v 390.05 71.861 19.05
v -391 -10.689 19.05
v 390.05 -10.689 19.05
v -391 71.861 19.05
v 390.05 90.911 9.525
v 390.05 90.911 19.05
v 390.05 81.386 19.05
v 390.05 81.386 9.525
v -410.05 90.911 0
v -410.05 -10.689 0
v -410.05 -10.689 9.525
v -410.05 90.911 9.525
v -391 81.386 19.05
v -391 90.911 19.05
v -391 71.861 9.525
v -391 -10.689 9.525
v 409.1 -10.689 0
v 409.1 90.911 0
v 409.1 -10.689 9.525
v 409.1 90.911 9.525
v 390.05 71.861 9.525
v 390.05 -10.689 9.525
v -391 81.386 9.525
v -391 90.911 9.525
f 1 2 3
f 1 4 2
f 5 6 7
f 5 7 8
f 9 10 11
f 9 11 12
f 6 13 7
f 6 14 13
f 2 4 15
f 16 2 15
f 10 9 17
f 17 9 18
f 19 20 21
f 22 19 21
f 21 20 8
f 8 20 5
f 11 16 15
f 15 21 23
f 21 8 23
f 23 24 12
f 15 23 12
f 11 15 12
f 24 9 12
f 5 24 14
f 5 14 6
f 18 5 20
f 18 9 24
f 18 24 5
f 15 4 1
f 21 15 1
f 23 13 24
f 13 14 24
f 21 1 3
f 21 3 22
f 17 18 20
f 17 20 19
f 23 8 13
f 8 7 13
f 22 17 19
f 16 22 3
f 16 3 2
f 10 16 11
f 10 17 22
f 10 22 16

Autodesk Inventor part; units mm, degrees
ref_plane "YZ Plane" through (0, 0, 0) normal (1, 0, 0) x (0, 1, 0)
ref_plane "XZ Plane" through (0, 0, 0) normal (0, 1, 0) x (-1, 0, 0)
ref_plane "XY Plane" through (0, 0, 0) normal (0, 0, 1) x (1, 0, 0)
sketch "Sketch2" plane through (0, 0, 0) normal (0, 0, 1) x (1, 0, 0)
  line L0 (-410.0497, 90.9112) -> (409.1003, 90.9112)
  line L1 (409.1003, 90.9112) -> (409.1003, -10.6888)
  line L2 (409.1003, -10.6888) -> (-410.0497, -10.6888)
  line L3 (-410.0497, -10.6888) -> (-410.0497, 90.9112)
  point P0 (0, 0)
  dimension "d0" = 819.15
  dimension "d1" = 101.6
extrude "Board" add sketch "Sketch2" along normal blind 19.05
sketch "Sketch10" plane through (0, 0, 19.05) normal (0, 0, 1) x (1, 0, 0)
  line L0 (409.1003, -10.6888) -> (409.1003, 90.9112) projected
  line L1 (409.1003, 81.3862) -> (-410.0497, 81.3862)
  line L2 (-410.0497, 81.3862) -> (-410.0497, 71.8612)
  line L3 (-410.0497, 71.8612) -> (409.1003, 71.8612)
  line L4 (409.1003, 71.8612) -> (409.1003, 81.3862)
  line L5 (-410.0497, 90.9112) -> (-410.0497, -10.6888) projected
  line L6 (409.1003, 90.9112) -> (-410.0497, 90.9112) projected
  point P0 (0, 0)
  dimension "d22" = 9.525
  dimension "d23" = 9.525
extrude "Extrusion7" cut sketch "Sketch10" against normal blind 9.525 contours L3 L2 L1 L0
sketch "Sketch11" plane through (-410.0497, 90.9112, 0) normal (0, 1, 0) x (1, 0, 0)
  line L0 (0, -19.05) -> (19.05, -19.05)
  line L1 (19.05, -19.05) -> (19.05, -9.525)
  line L2 (19.05, -9.525) -> (0, -9.525)
  line L3 (0, -9.525) -> (0, -19.05)
  line L4 (819.15, -9.525) -> (0, -9.525) projected
  line L5 (819.15, 0) -> (819.15, -19.05) projected
  line L6 (0, -9.525) -> (819.15, -9.525) projected
  line L7 (819.15, -19.05) -> (800.1, -19.05)
  line L8 (800.1, -19.05) -> (800.1, -9.525)
  line L9 (800.1, -9.525) -> (819.15, -9.525)
  line L10 (819.15, -9.525) -> (819.15, -19.05)
  point P0 (410.0497, 0)
  dimension "d28" = 19.05
  dimension "d29" = 19.05
extrude "End Notches" cut sketch "Sketch11" against normal blind 101.6
equation "\"d30\" = d1"
properties part number "Base Runner Front"
